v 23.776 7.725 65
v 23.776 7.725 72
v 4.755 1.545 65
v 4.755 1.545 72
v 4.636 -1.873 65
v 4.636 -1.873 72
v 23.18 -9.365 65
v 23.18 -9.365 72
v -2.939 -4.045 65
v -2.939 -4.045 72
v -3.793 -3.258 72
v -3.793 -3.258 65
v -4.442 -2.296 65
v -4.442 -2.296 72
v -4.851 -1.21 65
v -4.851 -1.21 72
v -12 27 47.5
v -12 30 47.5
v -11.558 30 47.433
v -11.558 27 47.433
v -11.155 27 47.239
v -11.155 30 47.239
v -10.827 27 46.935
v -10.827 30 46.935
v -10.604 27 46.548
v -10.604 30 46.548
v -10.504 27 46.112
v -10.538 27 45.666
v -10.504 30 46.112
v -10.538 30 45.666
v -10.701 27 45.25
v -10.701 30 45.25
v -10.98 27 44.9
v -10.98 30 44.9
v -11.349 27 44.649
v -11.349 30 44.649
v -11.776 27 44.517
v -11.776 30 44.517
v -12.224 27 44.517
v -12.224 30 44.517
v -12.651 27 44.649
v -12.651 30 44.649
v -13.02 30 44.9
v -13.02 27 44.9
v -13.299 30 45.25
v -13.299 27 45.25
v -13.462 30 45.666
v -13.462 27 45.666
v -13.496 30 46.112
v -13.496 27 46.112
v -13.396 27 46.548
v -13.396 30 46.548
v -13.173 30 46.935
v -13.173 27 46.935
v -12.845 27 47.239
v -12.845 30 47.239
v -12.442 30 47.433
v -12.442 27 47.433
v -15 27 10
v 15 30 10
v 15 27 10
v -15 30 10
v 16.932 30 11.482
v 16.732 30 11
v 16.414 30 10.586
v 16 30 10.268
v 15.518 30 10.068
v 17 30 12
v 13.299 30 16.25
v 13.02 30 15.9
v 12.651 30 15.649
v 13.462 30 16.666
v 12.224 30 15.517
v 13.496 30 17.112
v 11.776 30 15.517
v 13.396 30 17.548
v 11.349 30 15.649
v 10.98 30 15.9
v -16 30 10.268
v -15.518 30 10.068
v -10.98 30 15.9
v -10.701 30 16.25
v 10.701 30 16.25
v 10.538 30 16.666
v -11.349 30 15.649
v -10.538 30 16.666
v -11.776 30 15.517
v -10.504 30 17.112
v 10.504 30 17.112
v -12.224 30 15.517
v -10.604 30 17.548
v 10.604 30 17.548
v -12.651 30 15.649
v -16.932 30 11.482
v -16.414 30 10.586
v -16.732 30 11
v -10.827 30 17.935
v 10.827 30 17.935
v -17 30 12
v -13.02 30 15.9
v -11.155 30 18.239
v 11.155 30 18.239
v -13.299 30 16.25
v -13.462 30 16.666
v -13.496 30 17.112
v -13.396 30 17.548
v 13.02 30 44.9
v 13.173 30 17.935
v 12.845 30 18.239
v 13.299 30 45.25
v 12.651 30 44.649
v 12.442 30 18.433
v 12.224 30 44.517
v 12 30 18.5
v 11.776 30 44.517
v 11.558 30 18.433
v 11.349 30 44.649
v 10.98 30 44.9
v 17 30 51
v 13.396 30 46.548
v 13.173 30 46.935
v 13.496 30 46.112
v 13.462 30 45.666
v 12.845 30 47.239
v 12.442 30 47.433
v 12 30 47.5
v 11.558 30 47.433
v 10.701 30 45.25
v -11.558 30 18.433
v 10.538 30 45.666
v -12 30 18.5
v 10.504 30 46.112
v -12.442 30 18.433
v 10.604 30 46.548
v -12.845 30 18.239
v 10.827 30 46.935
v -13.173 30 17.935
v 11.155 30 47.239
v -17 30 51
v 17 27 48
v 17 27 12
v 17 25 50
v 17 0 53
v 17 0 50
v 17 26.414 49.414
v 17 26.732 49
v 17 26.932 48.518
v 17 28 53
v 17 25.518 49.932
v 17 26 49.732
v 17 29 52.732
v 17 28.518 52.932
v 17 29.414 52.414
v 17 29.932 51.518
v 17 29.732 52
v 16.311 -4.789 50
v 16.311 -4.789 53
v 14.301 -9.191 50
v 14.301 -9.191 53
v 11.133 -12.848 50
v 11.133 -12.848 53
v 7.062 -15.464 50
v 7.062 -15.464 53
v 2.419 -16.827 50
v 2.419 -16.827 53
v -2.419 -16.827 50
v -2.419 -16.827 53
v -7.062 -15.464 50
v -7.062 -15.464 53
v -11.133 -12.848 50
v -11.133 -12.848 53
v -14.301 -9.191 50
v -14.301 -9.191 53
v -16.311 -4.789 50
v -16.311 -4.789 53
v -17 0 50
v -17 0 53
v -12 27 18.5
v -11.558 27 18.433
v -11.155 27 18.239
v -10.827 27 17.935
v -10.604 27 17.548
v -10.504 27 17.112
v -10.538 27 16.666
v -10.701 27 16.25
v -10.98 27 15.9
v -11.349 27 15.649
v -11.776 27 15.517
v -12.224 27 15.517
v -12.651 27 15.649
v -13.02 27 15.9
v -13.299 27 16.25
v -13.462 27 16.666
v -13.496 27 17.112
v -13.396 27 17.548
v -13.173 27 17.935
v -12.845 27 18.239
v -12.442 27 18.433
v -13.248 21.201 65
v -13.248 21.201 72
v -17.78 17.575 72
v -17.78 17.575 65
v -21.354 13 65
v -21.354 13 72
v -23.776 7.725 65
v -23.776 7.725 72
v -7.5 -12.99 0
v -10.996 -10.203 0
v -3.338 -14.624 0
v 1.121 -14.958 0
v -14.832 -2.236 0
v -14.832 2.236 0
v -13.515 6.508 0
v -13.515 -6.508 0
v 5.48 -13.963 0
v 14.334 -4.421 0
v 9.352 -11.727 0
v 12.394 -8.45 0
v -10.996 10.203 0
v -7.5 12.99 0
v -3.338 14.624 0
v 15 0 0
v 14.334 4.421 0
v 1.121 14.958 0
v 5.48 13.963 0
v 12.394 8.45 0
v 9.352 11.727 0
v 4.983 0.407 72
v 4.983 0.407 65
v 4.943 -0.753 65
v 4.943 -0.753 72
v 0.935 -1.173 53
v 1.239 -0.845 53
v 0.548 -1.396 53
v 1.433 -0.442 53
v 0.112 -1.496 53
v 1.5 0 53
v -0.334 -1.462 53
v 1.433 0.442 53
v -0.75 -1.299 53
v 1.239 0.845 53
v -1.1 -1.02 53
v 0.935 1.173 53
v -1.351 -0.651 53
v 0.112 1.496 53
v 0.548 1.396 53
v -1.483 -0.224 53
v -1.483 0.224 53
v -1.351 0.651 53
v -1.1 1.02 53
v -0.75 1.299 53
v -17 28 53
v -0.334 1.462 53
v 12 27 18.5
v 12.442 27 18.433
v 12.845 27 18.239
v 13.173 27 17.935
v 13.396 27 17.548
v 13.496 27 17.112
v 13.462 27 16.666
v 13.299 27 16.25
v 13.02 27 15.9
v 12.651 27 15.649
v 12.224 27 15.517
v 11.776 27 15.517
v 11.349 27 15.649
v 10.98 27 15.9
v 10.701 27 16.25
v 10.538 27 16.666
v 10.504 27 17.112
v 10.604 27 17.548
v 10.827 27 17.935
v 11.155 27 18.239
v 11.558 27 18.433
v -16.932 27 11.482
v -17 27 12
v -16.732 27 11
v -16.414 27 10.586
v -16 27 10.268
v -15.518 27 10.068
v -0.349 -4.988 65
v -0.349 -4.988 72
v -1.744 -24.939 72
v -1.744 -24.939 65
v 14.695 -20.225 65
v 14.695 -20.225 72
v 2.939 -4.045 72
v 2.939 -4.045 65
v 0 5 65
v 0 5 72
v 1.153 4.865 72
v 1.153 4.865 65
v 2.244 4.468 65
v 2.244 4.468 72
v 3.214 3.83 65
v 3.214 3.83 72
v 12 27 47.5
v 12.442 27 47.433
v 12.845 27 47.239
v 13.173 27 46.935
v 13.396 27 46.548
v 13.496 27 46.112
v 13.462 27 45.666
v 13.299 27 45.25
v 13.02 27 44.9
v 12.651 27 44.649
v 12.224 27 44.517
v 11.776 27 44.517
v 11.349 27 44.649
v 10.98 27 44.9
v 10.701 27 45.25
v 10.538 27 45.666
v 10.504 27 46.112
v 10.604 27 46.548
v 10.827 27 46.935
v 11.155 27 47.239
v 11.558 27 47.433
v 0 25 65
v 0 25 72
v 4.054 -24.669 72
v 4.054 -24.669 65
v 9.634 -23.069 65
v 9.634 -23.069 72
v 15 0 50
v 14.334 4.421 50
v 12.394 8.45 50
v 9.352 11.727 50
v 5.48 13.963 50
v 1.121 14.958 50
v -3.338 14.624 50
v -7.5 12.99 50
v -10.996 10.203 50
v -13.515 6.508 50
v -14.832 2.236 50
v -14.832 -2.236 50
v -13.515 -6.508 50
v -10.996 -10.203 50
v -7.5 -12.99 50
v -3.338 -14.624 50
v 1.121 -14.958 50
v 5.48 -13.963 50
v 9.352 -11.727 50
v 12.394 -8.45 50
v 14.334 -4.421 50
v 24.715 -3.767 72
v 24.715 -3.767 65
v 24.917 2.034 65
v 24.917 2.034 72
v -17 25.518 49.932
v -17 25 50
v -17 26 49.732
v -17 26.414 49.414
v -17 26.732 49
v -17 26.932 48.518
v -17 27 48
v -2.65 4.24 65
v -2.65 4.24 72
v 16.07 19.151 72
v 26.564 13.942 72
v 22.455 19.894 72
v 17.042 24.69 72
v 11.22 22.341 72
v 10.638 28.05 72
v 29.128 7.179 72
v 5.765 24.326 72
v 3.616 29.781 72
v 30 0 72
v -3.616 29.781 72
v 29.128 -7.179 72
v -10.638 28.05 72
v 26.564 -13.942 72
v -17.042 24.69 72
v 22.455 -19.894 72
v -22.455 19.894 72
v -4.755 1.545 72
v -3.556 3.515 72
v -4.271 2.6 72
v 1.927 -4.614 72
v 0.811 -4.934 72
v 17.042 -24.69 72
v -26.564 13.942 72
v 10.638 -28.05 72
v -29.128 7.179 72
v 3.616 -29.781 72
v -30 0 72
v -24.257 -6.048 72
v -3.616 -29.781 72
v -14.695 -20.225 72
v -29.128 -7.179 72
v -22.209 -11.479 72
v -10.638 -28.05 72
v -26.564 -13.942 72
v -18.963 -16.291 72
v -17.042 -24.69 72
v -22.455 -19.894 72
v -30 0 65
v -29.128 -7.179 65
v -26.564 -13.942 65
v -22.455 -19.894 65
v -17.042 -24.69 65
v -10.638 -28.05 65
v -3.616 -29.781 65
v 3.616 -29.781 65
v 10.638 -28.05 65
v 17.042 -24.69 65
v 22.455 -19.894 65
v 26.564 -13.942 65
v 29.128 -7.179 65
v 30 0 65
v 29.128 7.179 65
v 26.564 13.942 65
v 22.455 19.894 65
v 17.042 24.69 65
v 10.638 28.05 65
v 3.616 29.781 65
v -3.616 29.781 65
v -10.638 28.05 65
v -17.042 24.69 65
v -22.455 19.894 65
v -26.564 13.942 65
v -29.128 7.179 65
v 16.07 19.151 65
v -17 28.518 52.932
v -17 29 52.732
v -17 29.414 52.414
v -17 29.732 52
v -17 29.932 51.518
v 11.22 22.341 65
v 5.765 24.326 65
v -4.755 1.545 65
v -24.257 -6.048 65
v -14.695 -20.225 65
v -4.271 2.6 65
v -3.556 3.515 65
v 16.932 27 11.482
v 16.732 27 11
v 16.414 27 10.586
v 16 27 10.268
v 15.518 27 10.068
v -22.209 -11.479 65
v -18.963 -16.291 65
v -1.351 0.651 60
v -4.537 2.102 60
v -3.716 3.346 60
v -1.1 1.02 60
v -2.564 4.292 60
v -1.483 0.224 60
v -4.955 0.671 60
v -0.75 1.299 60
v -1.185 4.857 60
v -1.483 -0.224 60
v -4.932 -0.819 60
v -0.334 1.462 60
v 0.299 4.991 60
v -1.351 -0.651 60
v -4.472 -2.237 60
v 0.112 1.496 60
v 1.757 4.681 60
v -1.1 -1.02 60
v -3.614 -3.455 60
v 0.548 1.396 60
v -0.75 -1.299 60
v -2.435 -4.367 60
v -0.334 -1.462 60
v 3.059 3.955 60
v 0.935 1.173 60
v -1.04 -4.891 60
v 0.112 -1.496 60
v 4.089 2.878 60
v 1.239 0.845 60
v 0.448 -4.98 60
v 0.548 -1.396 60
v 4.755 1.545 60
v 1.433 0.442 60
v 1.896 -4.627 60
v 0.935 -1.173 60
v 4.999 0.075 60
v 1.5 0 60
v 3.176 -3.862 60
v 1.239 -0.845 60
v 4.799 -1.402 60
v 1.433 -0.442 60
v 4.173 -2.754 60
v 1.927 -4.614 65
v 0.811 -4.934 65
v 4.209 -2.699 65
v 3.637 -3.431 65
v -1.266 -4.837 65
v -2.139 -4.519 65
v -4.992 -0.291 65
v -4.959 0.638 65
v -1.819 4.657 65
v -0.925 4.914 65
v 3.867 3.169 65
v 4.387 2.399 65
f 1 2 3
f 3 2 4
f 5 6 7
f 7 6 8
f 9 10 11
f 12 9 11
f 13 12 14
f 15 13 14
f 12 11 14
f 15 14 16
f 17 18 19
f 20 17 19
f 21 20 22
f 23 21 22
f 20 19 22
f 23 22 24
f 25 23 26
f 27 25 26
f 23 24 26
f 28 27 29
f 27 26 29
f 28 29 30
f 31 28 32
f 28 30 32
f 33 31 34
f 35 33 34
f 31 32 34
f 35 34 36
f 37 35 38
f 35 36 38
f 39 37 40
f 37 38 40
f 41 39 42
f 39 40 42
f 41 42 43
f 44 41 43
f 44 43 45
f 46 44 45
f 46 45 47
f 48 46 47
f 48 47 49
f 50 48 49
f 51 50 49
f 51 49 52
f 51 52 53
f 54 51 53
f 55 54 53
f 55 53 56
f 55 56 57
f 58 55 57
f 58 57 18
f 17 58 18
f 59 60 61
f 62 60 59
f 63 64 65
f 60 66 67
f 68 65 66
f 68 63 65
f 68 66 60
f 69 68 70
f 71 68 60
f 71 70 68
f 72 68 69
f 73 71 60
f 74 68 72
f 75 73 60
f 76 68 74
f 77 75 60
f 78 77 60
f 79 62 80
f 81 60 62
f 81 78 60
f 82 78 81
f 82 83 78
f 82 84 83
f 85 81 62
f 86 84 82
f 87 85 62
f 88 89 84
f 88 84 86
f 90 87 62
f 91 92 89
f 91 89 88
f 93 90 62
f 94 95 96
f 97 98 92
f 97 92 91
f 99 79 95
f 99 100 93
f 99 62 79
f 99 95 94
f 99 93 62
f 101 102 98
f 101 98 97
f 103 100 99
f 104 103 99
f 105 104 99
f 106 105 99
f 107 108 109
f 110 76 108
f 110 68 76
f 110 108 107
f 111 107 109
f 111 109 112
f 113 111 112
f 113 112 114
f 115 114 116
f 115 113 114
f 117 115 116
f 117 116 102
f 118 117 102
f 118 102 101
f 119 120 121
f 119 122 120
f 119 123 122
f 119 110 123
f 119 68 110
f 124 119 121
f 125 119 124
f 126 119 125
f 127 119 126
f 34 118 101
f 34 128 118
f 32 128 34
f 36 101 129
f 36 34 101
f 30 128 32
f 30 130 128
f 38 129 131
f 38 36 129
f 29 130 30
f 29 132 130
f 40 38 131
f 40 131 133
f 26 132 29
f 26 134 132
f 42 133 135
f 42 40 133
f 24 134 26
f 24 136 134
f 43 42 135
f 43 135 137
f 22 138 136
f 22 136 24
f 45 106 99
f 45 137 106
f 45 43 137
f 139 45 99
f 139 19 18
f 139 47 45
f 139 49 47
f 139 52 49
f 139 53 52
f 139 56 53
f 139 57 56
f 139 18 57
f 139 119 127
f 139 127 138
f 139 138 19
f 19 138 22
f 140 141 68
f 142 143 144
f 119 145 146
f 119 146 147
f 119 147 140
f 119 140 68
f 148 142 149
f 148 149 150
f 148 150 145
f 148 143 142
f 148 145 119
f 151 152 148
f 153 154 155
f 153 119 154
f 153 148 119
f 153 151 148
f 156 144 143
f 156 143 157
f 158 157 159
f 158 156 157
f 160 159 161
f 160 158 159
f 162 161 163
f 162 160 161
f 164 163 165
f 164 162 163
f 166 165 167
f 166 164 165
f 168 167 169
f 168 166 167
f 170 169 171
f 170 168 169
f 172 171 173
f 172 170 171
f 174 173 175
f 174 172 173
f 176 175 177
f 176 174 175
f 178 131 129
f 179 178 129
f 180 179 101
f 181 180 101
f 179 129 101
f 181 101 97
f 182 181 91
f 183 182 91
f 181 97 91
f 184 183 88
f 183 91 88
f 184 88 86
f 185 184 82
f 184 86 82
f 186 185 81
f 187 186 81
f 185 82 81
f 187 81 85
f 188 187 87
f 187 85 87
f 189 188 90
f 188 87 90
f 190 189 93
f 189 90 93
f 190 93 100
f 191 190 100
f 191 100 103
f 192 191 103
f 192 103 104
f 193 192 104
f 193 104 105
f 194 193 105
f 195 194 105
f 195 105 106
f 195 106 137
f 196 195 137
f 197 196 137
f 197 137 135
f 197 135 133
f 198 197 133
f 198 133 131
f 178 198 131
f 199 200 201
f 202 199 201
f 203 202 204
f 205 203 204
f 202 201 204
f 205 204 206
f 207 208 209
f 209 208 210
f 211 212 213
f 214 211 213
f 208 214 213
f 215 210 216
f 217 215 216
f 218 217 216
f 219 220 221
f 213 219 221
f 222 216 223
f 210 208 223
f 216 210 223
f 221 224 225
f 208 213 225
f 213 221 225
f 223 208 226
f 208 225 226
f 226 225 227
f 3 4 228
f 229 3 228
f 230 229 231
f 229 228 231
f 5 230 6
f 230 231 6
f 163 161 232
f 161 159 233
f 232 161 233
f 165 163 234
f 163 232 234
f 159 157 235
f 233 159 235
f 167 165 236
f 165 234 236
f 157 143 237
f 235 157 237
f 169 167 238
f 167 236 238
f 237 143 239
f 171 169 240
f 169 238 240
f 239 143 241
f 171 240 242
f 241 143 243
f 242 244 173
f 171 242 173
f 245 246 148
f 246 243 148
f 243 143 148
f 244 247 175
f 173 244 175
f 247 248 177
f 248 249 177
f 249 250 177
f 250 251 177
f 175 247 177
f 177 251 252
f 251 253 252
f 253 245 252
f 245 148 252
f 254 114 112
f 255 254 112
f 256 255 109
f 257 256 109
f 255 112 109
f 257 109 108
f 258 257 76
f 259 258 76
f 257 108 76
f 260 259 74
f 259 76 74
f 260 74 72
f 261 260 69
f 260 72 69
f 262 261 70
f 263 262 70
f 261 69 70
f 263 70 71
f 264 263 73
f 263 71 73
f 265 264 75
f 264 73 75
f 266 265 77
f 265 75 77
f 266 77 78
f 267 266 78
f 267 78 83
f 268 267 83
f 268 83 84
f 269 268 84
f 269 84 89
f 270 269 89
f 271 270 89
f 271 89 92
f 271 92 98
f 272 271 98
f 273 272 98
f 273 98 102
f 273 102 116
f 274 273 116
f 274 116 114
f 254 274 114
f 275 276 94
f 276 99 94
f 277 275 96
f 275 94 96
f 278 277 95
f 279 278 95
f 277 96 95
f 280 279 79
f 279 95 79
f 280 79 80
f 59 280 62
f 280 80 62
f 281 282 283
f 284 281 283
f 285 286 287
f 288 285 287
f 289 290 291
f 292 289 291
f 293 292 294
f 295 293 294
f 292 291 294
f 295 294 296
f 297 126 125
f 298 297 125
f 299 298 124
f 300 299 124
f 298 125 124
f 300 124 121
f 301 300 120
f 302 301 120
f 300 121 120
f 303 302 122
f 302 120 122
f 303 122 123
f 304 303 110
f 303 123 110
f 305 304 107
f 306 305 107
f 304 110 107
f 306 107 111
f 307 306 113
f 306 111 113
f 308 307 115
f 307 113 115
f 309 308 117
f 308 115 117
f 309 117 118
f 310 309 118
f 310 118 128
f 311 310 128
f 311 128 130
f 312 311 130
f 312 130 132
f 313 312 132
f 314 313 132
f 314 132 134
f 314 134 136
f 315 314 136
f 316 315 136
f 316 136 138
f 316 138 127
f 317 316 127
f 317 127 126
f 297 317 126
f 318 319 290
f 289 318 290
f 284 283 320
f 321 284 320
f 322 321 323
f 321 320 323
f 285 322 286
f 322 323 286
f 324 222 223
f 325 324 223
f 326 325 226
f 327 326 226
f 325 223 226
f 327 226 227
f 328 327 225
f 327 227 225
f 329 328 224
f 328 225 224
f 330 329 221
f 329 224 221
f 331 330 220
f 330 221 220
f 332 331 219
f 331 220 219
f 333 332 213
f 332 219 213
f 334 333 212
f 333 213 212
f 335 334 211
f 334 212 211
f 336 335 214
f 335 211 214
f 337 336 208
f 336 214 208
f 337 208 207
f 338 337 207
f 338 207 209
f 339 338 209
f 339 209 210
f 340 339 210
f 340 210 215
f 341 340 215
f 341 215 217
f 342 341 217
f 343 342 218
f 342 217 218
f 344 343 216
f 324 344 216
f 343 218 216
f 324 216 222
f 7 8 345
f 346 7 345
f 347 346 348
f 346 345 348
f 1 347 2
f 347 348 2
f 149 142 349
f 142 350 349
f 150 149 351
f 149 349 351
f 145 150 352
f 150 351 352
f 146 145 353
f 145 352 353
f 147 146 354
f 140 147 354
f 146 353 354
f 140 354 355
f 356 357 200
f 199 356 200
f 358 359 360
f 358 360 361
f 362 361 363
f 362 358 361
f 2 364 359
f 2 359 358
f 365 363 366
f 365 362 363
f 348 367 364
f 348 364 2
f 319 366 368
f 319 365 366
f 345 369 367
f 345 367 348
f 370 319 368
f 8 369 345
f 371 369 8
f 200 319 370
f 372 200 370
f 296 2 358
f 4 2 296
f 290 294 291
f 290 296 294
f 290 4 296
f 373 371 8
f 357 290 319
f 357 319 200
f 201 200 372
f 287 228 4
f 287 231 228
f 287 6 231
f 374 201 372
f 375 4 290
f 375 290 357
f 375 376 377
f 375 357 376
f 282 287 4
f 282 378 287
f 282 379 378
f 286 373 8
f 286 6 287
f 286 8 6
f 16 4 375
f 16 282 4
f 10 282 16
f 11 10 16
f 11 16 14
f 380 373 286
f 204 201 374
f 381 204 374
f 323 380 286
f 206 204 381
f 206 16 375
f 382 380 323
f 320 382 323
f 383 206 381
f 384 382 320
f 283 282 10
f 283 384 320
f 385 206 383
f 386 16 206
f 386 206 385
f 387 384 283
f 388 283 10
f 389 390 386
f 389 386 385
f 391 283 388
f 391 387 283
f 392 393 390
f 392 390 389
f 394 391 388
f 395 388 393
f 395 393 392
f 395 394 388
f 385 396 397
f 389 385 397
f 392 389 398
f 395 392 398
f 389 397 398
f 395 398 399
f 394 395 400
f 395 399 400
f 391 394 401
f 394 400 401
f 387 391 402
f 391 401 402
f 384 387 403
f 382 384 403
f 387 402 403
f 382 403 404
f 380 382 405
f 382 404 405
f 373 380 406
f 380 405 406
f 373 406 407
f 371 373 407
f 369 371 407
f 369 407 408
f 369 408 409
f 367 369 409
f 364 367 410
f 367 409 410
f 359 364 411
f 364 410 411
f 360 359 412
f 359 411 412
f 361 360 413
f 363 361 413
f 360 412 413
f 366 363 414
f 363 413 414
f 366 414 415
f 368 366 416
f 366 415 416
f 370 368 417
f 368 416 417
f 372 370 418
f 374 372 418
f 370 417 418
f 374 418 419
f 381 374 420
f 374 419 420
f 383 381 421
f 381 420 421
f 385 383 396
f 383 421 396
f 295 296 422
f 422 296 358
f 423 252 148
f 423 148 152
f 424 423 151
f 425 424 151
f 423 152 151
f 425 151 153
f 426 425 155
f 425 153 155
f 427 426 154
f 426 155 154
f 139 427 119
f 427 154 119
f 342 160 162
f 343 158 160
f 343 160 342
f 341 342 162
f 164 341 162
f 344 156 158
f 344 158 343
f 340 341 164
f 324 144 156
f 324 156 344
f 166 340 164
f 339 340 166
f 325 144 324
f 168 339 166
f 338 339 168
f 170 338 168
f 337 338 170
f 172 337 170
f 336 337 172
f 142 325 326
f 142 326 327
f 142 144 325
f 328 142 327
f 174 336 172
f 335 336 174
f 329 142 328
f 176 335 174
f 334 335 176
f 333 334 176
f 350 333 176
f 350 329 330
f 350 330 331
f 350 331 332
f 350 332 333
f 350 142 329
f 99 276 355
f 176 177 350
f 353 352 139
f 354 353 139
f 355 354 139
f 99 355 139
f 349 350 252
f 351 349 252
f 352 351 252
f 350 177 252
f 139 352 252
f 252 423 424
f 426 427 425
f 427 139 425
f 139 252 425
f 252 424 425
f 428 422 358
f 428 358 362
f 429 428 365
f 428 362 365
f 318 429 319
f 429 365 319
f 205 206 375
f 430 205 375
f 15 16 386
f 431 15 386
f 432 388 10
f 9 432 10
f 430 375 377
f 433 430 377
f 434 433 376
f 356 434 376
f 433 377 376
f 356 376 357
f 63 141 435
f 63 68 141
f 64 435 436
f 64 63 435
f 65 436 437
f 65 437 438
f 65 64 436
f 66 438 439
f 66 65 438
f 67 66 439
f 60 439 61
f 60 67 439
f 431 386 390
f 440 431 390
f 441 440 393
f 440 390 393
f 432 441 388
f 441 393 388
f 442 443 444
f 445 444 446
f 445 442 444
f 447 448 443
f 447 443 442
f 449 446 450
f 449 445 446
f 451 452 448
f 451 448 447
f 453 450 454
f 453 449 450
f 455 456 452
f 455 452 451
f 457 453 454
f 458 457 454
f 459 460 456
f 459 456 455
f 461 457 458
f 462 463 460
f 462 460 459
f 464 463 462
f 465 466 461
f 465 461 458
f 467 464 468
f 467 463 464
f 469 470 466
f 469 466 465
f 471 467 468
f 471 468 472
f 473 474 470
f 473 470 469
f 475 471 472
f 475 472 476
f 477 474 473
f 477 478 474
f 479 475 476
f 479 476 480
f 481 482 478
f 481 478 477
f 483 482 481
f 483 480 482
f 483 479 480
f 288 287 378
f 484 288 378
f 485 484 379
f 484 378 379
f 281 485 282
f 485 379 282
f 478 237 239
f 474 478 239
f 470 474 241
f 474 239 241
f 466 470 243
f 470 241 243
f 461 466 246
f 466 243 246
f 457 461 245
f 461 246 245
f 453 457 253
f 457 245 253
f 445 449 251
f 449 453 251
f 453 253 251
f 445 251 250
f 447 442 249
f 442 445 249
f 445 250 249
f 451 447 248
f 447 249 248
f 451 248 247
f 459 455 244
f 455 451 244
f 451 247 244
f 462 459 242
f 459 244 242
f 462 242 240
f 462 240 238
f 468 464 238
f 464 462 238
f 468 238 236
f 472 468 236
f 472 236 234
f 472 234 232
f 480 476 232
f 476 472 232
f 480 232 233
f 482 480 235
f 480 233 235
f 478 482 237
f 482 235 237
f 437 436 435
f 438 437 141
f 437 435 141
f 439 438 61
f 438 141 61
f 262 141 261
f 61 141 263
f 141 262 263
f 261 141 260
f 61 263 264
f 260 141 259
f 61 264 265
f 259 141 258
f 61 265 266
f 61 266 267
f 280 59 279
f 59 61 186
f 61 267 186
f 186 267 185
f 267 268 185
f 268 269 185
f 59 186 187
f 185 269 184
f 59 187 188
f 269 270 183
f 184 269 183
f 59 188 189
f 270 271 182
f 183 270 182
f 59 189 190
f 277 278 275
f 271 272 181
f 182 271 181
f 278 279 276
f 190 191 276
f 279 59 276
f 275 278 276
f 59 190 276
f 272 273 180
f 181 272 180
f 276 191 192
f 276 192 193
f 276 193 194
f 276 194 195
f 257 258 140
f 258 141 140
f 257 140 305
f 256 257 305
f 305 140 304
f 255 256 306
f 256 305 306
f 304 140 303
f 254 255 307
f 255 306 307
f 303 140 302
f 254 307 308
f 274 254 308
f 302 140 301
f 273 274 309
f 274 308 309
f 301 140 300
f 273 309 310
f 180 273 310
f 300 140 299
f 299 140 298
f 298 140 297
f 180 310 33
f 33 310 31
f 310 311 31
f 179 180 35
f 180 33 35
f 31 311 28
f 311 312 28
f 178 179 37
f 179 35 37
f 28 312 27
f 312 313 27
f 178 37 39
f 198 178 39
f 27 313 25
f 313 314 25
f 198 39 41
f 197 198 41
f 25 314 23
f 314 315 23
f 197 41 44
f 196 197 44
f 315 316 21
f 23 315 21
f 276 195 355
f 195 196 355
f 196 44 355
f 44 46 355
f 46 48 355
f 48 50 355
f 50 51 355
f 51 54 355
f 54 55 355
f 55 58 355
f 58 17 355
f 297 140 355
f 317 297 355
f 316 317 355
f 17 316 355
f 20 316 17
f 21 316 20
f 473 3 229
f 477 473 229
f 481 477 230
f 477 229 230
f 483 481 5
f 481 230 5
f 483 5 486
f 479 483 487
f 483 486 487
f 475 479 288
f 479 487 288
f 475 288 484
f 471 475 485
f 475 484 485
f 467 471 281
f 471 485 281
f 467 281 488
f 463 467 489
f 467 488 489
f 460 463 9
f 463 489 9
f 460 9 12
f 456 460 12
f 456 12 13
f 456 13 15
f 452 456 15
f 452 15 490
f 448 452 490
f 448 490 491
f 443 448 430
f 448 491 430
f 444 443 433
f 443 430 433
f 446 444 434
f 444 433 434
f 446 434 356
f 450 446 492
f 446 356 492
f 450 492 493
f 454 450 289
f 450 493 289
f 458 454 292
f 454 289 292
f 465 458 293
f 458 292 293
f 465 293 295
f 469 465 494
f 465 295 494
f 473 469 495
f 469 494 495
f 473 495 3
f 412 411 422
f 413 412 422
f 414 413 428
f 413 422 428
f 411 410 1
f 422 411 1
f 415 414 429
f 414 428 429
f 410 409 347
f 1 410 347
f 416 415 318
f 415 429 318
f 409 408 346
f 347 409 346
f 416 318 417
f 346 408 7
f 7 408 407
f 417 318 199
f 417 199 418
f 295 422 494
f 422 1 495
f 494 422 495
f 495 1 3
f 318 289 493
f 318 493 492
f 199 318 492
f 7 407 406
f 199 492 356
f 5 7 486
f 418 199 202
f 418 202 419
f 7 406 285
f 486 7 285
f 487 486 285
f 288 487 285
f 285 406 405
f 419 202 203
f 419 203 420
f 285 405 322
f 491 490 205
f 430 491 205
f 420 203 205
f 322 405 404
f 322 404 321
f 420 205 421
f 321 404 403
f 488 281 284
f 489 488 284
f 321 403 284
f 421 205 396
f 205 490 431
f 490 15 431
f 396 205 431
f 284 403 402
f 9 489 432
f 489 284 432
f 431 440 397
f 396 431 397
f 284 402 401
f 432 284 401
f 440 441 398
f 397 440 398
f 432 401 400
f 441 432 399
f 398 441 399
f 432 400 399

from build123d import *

# Parameters (mm, degrees)
SKETCH1_R           = 15
BOSS_EXTRUDE1_DEPTH = 50
SKETCH2_R           = 1.5
BOSS_EXTRUDE2_DEPTH = 15
BOSS_EXTRUDE4_DEPTH = 3
SKETCH5_W           = 34
SKETCH5_H           = 3
BOSS_EXTRUDE5_DEPTH = 40
FILLET2_R           = 2
SKETCH6_R           = 30
BOSS_EXTRUDE6_DEPTH = 7
CUT_EXTRUDE1_DEPTH  = 7
SKETCH8_R           = 5
BOSS_EXTRUDE7_DEPTH = 5
SKETCH9_R           = 1.5
CUT_EXTRUDE2_DEPTH  = 5


with BuildPart() as part:
    # Sketch1 → Boss-Extrude1 (new body)
    with BuildSketch(Plane.XY):
        Circle(SKETCH1_R)
    extrude(amount=BOSS_EXTRUDE1_DEPTH)

    # Sketch2 → Boss-Extrude2 (add)
    with BuildSketch(Plane.XY.offset(50)):
        Circle(SKETCH2_R)
    extrude(amount=BOSS_EXTRUDE2_DEPTH)

    # Sketch4 → Boss-Extrude4 (add)
    with BuildSketch(Plane.XY.offset(50)):
        with BuildLine():
            Line((-17, 0), (-17, 30))
            Line((-17, 30), (17, 30))
            Line((17, 30), (17, 0))
            ThreePointArc((17, 0), (0, -17), (-17, 0))
        make_face()
    extrude(amount=BOSS_EXTRUDE4_DEPTH)

    # Sketch5 → Boss-Extrude5 (add)
    with BuildSketch(Plane(origin=(0, 0, 50), x_dir=(-1, 0, 0), z_dir=(0, 0, -1))):
        with Locations((0, 28.5)):
            Rectangle(SKETCH5_W, SKETCH5_H)
    extrude(amount=BOSS_EXTRUDE5_DEPTH)

    # Fillet2
    fillet2_edges = [part.edges().sort_by_distance(p)[0] for p in [
        (0, 30, 53),
        (0, 27, 50),
        (17, 28.5, 10),
        (-17, 28.5, 10),
    ]]
    fillet(fillet2_edges, radius=FILLET2_R)

    # Sketch6 → Boss-Extrude6 (add)
    with BuildSketch(Plane.XY.offset(65)):
        with Locations(Location((0, 0, 0), (0, 0, 180))):
            Circle(SKETCH6_R)
    extrude(amount=BOSS_EXTRUDE6_DEPTH)

    # Sketch7 → Cut-Extrude1 (cut)
    with BuildSketch(Plane.XY.offset(72)):
        with BuildLine():
            Line((0, 25), (0, 5))
            ThreePointArc((0, 5), (1.710100717, 4.698463104), (3.213938048, 3.830222216))
            Line((3.213938048, 3.830222216), (16.069690242, 19.151111078))
            ThreePointArc((16.069690242, 19.151111078), (8.550503583, 23.49231552), (0, 25))
        make_face()
        with BuildLine():
            Line((23.776412907, 7.725424859), (4.755282581, 1.545084972))
            ThreePointArc((4.755282581, 1.545084972), (4.996954135, -0.174497484), (4.635919273, -1.873032967))
            Line((4.635919273, -1.873032967), (23.179596364, -9.365164835))
            ThreePointArc((23.179596364, -9.365164835), (24.984770675, -0.872487418), (23.776412907, 7.725424859))
        make_face()
        with BuildLine():
            Line((14.694631307, -20.225424859), (2.938926261, -4.045084972))
            ThreePointArc((2.938926261, -4.045084972), (1.378186779, -4.80630848), (-0.348782369, -4.987820251))
            Line((-0.348782369, -4.987820251), (-1.743911844, -24.939101256))
            ThreePointArc((-1.743911844, -24.939101256), (6.890933895, -24.031542398), (14.694631307, -20.225424859))
        make_face()
        with BuildLine():
            Line((-14.694631307, -20.225424859), (-2.938926261, -4.045084972))
            ThreePointArc((-2.938926261, -4.045084972), (-4.145187863, -2.795964517), (-4.851478631, -1.209609478))
            Line((-4.851478631, -1.209609478), (-24.257393157, -6.04804739))
            ThreePointArc((-24.257393157, -6.04804739), (-20.725939314, -13.979822587), (-14.694631307, -20.225424859))
        make_face()
        with BuildLine():
            Line((-23.776412907, 7.725424859), (-4.755282581, 1.545084972))
            ThreePointArc((-4.755282581, 1.545084972), (-3.940053768, 3.078307377), (-2.649596321, 4.240240481))
            Line((-2.649596321, 4.240240481), (-13.247981606, 21.201202404))
            ThreePointArc((-13.247981606, 21.201202404), (-19.70026884, 15.391536883), (-23.776412907, 7.725424859))
        make_face()
    extrude(amount=-CUT_EXTRUDE1_DEPTH, mode=Mode.SUBTRACT)

    # Sketch8 → Boss-Extrude7 (add)
    with BuildSketch(Plane(origin=(0, 0, 65), x_dir=(-1, 0, 0), z_dir=(0, 0, -1))):
        with Locations(Location((0, 0, 0), (0, 0, 162))):
            Circle(SKETCH8_R)
    extrude(amount=BOSS_EXTRUDE7_DEPTH)

    # Sketch9 → Cut-Extrude2 (cut)
    with BuildSketch(Plane(origin=(0, 30, 0), x_dir=(1, 0, 0), z_dir=(0, 1, 0))):
        with Locations(Location((-12, -46, 0), (0, 0, 270))):
            Circle(SKETCH9_R)
        with Locations(Location((-12, -17, 0), (0, 0, 270))):
            Circle(SKETCH9_R)
        with Locations(Location((12, -46, 0), (0, 0, 270))):
            Circle(SKETCH9_R)
        with Locations(Location((12, -17, 0), (0, 0, 270))):
            Circle(SKETCH9_R)
    extrude(amount=-CUT_EXTRUDE2_DEPTH, mode=Mode.SUBTRACT)


solid = part.part
